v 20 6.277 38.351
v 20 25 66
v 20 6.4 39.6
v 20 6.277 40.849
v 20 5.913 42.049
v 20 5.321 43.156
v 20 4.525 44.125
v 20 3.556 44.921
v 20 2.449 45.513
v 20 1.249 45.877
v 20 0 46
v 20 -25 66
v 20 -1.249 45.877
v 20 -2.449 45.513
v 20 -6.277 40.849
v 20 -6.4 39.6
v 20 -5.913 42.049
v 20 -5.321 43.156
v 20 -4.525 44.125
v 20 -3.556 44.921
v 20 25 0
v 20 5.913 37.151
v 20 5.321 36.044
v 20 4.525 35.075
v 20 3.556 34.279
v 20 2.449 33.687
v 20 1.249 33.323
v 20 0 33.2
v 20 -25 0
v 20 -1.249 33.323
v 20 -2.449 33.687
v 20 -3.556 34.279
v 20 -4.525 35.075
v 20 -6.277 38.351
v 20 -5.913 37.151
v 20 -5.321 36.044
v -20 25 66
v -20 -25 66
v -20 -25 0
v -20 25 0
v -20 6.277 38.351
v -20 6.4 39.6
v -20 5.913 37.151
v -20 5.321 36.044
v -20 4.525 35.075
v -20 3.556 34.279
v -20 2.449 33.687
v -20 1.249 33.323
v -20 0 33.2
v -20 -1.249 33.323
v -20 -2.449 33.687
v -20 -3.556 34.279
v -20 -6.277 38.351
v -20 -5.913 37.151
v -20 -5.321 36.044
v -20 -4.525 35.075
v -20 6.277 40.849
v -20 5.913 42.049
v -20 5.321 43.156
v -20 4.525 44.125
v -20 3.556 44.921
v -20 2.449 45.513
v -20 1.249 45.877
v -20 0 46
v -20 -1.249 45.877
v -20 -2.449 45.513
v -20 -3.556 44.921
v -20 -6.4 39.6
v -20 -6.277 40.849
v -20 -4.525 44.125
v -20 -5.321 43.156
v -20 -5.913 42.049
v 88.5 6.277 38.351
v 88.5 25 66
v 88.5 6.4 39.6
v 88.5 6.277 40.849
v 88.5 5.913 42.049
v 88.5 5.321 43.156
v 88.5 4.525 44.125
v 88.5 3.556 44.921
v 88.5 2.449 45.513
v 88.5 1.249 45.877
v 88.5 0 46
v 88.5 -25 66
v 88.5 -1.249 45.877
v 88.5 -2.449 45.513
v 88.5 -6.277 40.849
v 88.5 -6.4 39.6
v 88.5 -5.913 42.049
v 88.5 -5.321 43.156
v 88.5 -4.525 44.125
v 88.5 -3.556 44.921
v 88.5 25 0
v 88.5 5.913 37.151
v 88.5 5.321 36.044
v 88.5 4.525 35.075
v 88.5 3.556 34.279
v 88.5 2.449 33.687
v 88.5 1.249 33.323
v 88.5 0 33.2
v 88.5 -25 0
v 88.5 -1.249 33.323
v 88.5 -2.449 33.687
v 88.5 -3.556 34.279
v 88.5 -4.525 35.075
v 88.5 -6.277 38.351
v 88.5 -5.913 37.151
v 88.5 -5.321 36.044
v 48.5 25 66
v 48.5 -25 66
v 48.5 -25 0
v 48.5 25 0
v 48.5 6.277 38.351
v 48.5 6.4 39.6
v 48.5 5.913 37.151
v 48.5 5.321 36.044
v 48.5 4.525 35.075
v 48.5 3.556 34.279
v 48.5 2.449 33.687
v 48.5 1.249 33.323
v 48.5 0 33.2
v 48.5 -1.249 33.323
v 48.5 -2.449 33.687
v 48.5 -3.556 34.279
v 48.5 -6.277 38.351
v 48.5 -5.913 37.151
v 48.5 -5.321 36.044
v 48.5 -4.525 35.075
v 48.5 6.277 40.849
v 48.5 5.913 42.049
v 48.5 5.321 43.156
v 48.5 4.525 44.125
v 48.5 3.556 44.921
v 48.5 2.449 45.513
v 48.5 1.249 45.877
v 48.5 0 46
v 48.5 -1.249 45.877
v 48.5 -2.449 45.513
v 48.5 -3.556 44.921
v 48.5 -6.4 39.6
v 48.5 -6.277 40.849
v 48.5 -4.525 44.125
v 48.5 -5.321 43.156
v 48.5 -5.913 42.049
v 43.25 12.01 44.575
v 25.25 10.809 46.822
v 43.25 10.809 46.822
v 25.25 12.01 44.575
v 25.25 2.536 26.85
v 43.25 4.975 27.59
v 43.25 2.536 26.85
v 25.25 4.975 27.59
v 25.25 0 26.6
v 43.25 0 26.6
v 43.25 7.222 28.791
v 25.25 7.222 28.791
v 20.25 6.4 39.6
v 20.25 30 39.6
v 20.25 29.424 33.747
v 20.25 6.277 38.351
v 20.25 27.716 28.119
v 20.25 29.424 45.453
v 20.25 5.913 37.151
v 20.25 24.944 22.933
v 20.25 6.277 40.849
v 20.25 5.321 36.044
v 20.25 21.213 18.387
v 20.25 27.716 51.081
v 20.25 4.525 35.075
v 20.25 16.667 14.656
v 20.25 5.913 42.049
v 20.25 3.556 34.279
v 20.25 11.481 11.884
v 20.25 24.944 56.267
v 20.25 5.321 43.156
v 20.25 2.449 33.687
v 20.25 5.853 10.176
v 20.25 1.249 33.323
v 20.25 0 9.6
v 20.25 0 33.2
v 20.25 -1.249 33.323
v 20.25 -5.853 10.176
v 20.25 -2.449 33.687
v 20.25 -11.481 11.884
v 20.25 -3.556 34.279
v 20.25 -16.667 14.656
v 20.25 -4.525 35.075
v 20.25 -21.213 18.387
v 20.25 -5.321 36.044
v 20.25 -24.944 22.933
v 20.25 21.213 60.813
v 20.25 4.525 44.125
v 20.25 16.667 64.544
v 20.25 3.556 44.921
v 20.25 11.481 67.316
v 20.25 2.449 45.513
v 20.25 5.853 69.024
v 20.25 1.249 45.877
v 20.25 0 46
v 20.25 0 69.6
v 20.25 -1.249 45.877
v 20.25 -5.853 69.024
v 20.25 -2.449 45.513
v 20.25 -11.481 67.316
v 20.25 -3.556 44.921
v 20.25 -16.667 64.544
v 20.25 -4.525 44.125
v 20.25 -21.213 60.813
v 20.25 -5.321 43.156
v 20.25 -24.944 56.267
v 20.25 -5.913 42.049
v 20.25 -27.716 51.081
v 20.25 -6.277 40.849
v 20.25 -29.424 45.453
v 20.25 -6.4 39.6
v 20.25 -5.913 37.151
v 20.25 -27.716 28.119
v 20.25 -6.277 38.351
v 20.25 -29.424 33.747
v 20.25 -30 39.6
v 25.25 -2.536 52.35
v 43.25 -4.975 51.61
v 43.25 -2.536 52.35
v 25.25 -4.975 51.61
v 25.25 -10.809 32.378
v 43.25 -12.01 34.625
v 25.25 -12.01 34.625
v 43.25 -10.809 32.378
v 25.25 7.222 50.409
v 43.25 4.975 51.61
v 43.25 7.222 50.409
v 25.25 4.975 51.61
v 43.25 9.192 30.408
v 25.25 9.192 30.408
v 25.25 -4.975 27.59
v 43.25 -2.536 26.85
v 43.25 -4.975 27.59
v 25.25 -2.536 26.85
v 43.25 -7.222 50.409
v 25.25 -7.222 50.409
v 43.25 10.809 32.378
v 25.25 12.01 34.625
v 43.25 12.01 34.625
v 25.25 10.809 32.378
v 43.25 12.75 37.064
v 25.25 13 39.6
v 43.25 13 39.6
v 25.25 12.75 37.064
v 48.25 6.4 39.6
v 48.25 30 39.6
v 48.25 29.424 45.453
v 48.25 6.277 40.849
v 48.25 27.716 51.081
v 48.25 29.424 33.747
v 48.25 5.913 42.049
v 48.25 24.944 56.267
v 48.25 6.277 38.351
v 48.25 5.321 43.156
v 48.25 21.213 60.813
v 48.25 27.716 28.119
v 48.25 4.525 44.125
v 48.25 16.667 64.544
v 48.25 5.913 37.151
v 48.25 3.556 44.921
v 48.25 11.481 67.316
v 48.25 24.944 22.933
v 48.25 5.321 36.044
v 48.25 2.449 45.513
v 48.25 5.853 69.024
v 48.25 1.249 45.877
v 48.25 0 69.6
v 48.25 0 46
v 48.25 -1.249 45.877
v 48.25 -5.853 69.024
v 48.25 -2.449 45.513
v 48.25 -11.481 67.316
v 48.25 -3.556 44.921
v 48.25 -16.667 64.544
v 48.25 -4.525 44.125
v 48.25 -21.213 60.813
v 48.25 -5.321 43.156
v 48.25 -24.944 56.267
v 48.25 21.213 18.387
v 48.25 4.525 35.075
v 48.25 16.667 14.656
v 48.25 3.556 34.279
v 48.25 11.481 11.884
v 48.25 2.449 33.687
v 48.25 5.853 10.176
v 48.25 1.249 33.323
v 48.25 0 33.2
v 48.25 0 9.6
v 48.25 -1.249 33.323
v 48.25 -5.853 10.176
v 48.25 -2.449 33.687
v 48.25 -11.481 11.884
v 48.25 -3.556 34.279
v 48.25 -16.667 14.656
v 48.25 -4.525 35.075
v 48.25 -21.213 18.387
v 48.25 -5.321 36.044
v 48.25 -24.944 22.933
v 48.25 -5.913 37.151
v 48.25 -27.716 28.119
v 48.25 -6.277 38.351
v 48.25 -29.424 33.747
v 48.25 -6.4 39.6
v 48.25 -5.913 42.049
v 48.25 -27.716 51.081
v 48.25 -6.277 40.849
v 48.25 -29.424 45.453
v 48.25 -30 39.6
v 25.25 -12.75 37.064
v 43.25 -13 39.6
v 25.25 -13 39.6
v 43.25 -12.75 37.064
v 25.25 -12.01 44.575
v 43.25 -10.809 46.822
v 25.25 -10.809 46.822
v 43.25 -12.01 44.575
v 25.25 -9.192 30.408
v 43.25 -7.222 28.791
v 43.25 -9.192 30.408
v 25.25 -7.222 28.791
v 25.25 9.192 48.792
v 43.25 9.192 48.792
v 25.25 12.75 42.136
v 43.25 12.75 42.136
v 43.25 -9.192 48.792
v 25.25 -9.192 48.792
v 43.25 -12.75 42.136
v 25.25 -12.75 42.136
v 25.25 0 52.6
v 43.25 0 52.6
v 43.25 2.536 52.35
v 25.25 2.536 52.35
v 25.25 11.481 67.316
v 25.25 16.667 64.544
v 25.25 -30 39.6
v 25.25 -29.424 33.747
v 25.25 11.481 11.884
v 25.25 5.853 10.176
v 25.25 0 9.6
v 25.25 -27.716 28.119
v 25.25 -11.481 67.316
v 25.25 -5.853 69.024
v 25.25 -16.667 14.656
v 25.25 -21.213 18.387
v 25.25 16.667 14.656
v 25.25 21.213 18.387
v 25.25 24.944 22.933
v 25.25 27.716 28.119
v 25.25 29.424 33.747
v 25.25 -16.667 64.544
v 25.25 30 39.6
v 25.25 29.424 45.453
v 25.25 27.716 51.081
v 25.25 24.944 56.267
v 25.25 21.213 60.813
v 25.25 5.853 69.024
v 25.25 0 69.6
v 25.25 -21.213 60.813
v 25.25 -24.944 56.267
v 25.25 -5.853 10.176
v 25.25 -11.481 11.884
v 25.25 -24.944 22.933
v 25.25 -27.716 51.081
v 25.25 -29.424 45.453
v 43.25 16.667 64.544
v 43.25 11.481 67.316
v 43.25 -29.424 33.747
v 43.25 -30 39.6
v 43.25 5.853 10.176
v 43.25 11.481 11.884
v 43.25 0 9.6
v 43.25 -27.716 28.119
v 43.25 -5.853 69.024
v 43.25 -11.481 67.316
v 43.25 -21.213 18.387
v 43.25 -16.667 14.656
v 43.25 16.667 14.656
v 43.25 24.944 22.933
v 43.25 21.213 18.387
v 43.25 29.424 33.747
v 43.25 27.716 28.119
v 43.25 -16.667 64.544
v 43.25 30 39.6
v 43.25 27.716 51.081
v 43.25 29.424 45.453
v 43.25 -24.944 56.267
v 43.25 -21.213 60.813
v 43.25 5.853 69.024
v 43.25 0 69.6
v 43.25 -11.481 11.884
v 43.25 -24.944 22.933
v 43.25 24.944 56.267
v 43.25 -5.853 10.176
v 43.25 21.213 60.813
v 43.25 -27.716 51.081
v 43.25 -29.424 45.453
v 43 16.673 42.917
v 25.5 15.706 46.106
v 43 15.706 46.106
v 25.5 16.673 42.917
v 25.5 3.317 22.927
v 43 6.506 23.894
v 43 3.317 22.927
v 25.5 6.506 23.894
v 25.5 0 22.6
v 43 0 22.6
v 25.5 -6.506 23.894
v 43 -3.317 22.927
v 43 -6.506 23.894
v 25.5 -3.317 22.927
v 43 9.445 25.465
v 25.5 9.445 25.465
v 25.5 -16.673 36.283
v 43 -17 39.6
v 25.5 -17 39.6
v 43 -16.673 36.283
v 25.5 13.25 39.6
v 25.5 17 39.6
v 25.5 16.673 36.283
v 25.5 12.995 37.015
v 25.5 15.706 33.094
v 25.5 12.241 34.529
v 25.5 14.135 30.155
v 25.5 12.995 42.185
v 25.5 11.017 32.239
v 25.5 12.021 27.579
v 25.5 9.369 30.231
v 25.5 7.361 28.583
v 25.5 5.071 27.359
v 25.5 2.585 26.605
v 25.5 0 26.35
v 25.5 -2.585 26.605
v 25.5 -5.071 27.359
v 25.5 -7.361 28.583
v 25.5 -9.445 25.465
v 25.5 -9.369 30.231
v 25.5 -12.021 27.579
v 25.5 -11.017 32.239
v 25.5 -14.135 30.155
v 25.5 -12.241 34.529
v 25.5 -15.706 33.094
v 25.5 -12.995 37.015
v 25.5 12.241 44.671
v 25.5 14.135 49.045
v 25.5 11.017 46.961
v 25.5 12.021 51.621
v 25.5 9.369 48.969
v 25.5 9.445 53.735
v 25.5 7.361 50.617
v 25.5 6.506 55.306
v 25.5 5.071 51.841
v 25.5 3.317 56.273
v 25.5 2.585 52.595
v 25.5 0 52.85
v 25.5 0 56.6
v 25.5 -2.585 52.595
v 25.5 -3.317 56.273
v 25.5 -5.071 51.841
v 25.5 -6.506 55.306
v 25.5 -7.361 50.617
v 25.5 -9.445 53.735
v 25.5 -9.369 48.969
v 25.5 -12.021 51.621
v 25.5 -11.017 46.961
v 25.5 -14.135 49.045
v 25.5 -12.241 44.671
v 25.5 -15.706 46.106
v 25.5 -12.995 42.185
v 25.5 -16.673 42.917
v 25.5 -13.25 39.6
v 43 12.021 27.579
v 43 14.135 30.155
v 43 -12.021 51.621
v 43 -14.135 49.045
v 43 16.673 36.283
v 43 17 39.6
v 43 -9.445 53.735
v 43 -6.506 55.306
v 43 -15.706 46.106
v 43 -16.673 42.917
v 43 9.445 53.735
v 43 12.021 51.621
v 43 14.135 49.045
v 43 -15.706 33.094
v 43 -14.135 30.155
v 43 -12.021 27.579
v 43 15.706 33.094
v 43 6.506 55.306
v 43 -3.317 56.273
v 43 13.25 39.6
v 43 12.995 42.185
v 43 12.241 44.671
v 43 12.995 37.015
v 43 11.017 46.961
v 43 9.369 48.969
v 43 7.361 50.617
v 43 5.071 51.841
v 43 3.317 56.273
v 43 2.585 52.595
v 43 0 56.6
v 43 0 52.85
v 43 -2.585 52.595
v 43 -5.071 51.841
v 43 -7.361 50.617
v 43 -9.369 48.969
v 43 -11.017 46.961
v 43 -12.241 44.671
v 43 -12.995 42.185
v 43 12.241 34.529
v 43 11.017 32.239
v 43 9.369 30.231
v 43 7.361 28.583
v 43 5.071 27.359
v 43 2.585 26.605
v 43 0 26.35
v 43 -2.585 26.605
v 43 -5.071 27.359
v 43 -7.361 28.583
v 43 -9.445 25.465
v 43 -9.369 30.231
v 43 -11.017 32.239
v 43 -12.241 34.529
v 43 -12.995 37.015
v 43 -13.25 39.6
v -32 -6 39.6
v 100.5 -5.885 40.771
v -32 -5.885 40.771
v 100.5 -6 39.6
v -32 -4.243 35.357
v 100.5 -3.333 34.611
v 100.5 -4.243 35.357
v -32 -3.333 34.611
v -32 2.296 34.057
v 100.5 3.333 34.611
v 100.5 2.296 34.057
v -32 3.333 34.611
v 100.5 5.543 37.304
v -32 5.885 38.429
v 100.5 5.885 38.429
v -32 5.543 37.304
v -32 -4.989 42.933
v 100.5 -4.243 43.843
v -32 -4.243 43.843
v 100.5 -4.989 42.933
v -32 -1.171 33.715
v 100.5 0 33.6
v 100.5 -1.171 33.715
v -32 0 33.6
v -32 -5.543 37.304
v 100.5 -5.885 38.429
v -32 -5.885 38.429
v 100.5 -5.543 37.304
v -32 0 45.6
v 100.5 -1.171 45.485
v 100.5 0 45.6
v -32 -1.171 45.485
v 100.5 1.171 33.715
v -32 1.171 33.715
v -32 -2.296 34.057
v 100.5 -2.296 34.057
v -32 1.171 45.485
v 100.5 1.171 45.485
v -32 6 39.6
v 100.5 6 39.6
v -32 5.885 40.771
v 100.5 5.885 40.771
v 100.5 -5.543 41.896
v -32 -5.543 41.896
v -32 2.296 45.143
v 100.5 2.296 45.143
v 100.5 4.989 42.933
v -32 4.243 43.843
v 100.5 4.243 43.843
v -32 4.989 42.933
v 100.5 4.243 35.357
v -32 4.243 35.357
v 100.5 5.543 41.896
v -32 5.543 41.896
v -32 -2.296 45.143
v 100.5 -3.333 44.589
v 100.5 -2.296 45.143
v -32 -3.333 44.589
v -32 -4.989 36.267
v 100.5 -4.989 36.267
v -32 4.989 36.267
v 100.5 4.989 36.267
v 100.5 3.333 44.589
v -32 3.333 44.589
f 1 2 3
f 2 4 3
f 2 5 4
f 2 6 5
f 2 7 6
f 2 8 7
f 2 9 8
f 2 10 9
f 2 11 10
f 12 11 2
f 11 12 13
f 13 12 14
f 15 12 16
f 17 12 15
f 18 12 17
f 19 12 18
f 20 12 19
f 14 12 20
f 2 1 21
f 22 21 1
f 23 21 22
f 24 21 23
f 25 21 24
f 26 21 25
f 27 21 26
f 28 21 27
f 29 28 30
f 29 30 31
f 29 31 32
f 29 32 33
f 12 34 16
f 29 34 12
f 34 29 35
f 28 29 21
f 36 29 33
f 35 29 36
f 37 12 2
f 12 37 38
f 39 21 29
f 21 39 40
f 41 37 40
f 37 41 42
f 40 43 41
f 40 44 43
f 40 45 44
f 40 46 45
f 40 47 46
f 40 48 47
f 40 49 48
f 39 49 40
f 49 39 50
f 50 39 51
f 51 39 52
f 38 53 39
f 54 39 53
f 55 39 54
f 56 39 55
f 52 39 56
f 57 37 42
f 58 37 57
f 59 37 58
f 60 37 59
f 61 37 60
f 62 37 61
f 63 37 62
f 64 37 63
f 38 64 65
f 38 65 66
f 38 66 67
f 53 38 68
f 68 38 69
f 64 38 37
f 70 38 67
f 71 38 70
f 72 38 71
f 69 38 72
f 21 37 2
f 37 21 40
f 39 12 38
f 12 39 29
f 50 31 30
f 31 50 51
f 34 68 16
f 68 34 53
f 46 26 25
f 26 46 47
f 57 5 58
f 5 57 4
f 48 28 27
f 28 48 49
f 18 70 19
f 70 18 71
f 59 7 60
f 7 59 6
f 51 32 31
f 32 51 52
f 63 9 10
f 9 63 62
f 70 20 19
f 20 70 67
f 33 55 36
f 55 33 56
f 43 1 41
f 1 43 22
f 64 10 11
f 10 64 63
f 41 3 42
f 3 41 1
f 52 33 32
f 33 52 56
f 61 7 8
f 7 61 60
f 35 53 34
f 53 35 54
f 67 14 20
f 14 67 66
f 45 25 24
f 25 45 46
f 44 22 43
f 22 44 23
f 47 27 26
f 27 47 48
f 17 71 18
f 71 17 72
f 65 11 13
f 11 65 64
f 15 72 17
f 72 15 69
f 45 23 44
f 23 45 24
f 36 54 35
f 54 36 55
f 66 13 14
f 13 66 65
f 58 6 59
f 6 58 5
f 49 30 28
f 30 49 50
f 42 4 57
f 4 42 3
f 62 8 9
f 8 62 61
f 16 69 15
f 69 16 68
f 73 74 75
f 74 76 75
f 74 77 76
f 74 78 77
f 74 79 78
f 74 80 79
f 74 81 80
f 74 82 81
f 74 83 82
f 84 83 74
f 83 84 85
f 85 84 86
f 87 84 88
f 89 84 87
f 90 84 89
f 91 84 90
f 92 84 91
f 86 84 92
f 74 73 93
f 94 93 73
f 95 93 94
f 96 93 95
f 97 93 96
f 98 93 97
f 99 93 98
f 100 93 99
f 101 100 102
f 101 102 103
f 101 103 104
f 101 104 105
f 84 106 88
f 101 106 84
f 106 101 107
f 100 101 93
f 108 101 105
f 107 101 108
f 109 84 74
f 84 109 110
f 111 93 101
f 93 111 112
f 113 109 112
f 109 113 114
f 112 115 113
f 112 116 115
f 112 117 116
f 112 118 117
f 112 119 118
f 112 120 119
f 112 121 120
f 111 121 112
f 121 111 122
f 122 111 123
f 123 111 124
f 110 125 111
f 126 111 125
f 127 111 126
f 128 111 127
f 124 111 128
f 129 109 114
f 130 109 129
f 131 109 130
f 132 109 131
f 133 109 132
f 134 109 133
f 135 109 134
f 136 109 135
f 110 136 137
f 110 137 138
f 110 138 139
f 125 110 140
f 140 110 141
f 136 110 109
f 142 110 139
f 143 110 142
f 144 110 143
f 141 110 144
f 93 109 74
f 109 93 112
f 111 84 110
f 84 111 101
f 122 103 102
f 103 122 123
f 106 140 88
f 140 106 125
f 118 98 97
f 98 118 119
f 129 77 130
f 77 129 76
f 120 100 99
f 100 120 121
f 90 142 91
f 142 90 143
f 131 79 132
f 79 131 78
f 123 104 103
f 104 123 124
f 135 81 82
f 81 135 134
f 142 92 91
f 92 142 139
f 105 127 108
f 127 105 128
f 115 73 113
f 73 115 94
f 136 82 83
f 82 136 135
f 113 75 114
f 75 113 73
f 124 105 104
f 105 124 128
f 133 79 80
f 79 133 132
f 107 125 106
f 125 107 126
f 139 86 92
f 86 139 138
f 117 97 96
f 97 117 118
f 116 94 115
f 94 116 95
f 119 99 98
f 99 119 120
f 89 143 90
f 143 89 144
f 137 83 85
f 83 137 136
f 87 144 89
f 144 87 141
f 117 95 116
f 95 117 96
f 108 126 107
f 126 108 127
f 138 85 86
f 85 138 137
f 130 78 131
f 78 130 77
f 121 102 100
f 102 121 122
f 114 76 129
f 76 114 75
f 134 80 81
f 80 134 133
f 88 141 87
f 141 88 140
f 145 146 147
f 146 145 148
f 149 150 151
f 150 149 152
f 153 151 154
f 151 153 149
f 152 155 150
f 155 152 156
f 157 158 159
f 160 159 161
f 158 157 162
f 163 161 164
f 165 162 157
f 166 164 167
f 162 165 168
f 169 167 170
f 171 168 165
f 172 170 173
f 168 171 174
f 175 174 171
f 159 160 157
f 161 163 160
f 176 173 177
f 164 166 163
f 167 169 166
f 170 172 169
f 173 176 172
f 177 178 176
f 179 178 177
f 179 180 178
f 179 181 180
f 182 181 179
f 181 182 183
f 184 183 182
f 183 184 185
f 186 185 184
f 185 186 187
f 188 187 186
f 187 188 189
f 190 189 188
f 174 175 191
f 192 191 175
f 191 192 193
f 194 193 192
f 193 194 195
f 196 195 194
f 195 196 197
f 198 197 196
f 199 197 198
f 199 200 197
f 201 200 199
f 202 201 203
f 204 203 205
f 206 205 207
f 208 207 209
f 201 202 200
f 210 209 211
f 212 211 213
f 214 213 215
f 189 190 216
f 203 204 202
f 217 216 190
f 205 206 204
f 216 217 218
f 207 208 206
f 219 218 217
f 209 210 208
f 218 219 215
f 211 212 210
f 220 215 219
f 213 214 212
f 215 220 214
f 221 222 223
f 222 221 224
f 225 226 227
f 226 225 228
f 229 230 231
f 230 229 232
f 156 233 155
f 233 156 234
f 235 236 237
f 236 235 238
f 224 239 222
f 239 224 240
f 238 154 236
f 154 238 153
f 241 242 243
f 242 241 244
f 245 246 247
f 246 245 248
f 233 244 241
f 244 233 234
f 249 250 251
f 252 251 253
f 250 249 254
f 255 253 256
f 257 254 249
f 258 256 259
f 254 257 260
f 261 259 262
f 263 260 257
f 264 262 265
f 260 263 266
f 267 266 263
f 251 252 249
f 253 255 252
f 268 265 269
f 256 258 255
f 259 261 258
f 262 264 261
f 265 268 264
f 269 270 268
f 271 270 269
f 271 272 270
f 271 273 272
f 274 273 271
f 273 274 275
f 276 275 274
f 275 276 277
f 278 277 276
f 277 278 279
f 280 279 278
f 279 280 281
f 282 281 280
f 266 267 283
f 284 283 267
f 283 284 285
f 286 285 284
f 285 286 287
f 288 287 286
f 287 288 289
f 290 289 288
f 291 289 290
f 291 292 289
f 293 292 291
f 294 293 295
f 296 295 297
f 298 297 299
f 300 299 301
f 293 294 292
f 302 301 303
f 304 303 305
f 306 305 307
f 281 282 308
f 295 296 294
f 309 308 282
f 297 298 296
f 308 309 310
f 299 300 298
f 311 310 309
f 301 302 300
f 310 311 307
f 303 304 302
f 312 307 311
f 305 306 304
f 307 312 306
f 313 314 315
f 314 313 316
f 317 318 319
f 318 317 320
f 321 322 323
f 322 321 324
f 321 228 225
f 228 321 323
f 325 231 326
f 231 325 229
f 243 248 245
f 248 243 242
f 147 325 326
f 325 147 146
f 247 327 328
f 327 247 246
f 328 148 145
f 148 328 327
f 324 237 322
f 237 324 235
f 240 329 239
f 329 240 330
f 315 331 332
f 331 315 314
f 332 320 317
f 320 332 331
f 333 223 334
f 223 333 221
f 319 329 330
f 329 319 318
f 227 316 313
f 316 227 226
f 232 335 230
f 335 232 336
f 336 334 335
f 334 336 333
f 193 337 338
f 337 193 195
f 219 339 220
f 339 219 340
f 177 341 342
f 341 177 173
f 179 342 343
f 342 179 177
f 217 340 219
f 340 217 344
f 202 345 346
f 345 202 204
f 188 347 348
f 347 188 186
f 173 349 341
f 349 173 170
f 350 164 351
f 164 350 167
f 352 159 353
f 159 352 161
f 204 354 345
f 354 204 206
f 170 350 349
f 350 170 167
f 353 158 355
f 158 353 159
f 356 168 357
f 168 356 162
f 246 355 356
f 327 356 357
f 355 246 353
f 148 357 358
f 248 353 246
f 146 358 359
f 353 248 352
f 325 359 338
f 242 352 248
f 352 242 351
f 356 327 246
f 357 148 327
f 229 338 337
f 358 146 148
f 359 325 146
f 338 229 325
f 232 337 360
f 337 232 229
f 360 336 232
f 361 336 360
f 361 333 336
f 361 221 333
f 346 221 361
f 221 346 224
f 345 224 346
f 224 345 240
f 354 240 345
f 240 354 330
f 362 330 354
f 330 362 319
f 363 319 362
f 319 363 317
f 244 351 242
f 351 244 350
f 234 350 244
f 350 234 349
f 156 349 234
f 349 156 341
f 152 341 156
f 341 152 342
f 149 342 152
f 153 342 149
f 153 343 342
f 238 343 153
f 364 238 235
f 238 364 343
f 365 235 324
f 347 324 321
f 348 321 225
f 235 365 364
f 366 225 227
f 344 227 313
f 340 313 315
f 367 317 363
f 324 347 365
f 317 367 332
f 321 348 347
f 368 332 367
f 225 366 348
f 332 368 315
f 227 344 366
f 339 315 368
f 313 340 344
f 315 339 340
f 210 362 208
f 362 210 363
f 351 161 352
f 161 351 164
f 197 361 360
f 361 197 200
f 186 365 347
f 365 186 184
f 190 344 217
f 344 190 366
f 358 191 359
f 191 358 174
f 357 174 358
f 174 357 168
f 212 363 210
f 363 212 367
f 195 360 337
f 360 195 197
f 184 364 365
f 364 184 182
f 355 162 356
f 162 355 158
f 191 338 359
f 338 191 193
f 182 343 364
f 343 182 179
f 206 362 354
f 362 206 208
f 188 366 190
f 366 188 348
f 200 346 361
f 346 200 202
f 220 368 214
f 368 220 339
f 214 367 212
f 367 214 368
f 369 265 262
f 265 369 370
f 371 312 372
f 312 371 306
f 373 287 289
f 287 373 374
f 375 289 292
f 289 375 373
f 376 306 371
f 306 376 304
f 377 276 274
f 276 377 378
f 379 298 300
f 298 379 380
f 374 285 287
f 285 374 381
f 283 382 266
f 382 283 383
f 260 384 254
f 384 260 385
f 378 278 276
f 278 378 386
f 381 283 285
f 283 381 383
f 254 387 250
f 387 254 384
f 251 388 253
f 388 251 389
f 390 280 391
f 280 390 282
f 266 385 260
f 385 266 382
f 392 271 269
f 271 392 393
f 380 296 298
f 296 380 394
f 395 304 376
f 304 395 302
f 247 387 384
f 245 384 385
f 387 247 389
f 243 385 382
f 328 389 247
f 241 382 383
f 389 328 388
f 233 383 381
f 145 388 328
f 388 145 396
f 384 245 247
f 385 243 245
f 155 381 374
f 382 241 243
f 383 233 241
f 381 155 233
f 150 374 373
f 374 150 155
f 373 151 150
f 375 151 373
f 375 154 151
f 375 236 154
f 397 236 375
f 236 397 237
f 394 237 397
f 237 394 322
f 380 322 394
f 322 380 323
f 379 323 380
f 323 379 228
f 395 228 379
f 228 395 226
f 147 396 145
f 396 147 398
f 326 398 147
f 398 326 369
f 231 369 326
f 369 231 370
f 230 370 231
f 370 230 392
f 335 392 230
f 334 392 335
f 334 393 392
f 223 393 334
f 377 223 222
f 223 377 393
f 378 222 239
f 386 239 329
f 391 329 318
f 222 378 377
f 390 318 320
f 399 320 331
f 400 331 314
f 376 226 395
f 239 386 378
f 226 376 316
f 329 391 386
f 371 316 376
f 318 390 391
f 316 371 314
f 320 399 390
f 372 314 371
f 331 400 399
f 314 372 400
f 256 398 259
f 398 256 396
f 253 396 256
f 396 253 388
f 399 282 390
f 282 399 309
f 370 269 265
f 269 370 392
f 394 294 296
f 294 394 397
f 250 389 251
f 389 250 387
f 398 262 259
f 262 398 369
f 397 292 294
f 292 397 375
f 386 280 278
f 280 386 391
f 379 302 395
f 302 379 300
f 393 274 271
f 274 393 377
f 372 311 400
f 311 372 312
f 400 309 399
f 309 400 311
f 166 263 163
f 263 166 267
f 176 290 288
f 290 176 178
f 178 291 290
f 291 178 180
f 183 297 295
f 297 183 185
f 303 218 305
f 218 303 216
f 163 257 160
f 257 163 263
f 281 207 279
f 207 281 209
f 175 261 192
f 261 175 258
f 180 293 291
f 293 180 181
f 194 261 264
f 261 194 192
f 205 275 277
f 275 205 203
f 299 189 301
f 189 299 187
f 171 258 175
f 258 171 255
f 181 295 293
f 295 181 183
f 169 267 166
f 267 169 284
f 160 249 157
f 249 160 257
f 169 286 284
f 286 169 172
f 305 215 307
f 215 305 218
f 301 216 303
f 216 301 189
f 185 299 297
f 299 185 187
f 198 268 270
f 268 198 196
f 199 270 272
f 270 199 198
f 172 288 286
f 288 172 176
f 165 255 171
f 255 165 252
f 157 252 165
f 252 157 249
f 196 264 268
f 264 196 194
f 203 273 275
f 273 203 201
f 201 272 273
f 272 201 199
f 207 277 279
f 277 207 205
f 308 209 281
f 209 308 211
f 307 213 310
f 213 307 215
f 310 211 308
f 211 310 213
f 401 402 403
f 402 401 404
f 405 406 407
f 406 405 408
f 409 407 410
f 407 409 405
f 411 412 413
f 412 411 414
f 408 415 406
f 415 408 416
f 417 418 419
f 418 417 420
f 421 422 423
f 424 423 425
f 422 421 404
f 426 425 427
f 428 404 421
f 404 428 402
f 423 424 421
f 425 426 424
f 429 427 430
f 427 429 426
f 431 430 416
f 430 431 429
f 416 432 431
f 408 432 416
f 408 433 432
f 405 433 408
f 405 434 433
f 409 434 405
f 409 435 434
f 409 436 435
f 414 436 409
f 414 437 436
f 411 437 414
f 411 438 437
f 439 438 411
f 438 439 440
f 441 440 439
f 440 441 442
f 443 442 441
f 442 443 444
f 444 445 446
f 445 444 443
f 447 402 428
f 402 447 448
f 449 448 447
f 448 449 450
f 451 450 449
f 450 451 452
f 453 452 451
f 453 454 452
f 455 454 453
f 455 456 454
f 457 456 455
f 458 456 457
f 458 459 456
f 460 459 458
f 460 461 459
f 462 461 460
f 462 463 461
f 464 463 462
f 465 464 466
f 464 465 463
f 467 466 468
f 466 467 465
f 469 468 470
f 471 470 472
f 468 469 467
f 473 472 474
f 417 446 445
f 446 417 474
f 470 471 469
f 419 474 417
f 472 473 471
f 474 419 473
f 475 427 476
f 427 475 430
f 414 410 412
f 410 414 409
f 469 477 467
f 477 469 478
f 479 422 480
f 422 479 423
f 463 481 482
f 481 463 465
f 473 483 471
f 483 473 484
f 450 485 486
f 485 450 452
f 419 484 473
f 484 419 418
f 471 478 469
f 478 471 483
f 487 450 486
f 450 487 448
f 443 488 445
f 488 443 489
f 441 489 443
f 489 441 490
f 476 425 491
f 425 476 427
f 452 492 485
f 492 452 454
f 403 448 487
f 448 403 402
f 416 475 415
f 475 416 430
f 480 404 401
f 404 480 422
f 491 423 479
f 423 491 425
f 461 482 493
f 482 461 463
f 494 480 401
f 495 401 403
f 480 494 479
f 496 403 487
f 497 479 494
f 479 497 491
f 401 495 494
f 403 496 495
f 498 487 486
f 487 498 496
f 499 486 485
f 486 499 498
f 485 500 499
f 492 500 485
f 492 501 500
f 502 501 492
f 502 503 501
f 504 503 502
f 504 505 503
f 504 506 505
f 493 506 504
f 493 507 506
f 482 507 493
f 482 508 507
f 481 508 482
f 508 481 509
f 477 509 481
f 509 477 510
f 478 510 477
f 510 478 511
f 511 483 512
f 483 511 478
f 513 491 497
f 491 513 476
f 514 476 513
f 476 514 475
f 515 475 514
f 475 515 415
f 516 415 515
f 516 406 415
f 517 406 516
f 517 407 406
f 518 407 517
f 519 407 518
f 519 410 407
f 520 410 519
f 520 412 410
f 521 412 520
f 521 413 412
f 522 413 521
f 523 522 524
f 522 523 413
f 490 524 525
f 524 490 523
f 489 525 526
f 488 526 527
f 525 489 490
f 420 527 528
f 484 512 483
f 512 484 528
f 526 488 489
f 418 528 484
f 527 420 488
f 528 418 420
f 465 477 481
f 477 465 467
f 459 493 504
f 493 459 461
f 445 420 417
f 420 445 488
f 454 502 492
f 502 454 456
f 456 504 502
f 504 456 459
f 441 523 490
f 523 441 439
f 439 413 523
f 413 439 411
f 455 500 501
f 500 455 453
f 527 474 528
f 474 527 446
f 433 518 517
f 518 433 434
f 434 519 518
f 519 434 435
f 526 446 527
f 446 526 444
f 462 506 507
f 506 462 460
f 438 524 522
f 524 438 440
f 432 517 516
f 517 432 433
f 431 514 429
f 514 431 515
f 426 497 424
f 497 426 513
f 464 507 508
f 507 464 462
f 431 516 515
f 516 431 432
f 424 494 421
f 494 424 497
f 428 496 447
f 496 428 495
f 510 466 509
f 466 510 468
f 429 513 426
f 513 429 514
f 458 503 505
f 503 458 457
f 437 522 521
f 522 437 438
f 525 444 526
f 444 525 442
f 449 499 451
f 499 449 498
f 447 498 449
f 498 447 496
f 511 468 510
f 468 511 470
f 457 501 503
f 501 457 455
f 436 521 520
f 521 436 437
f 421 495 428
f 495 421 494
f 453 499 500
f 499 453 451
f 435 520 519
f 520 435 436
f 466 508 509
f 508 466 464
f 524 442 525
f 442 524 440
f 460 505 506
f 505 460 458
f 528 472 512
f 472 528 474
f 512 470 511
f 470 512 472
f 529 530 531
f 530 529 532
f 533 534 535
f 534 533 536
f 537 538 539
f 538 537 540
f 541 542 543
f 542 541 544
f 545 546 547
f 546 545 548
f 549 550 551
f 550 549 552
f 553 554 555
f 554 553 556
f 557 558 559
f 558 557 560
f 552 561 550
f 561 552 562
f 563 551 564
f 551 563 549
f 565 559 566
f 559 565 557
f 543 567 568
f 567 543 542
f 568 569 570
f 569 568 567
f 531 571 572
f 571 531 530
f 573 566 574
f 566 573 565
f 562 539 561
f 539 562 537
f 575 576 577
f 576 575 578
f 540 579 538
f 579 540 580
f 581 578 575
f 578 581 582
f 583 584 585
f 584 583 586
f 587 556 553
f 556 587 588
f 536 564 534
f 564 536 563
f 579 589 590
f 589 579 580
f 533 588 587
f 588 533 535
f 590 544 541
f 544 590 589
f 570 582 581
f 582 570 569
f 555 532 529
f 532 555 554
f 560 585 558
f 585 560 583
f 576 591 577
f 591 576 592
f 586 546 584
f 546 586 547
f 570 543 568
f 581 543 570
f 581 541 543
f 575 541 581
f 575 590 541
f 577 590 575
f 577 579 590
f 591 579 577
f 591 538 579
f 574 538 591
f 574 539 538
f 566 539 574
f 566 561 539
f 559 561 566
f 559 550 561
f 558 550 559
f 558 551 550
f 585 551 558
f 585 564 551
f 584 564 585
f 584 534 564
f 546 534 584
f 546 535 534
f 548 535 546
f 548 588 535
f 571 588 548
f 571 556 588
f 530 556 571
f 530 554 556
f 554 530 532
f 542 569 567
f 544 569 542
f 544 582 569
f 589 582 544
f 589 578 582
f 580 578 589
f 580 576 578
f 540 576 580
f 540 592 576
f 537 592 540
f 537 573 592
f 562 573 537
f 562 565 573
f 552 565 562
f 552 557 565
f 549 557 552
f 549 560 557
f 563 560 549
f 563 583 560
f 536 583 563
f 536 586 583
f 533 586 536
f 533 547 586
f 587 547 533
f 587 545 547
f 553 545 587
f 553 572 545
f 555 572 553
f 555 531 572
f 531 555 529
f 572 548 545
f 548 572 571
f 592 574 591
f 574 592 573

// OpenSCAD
$fn = 32;

// ------------------------------------------------------------------------
// Pulley assembly: d60 pulley with a belt, shaft d12
// Every part is its own module, assembly() places them once.
// ------------------------------------------------------------------------

// --- part 1 ---
module support1() {
  difference() {
    translate([-20, -25, 0]) cube([40, 50, 66]);
    translate([0, 0, 39.6]) rotate([0, 90, 0]) cylinder(h = 42, d = 12.8, center = true);
  }
}

// --- part 2 ---
module support2() {
  difference() {
    translate([-20, -25, 0]) cube([40, 50, 66]);
    translate([0, 0, 39.6]) rotate([0, 90, 0]) cylinder(h = 42, d = 12.8, center = true);
  }
}

// --- part 3 ---
module shaft() {
  translate([0, 0, -66.25]) cylinder(h = 132.5, d = 12);
}

// --- part 4 ---
module pulley() {
  difference() {
    union() {
      cylinder(h = 28, d = 26);
      cylinder(h = 5, d = 60);
      translate([0, 0, 23]) cylinder(h = 5, d = 60);
    }
    translate([0, 0, -1]) cylinder(h = 30, d = 12.8);
  }
}

// --- part 5 ---
module belt() {
  difference() {
      translate([0, 0, 0]) cylinder(h = 17.5, d = 34);
      translate([0, 0, -1]) cylinder(h = 19.5, d = 26.5);
    }
}

// --- assembly ---
module assembly() {
  translate([0, 0, 0]) rotate([0, 0, 0]) support1();
  translate([68.5, 0, 0]) rotate([0, 0, 0]) support2();
  translate([34.25, 0, 39.6]) rotate([0, 90, 0]) shaft();
  translate([20.25, 0, 39.6]) rotate([0, 90, 0]) pulley();
  translate([25.5, 0, 39.6]) rotate([0, 90, 0]) belt();
}

assembly();
